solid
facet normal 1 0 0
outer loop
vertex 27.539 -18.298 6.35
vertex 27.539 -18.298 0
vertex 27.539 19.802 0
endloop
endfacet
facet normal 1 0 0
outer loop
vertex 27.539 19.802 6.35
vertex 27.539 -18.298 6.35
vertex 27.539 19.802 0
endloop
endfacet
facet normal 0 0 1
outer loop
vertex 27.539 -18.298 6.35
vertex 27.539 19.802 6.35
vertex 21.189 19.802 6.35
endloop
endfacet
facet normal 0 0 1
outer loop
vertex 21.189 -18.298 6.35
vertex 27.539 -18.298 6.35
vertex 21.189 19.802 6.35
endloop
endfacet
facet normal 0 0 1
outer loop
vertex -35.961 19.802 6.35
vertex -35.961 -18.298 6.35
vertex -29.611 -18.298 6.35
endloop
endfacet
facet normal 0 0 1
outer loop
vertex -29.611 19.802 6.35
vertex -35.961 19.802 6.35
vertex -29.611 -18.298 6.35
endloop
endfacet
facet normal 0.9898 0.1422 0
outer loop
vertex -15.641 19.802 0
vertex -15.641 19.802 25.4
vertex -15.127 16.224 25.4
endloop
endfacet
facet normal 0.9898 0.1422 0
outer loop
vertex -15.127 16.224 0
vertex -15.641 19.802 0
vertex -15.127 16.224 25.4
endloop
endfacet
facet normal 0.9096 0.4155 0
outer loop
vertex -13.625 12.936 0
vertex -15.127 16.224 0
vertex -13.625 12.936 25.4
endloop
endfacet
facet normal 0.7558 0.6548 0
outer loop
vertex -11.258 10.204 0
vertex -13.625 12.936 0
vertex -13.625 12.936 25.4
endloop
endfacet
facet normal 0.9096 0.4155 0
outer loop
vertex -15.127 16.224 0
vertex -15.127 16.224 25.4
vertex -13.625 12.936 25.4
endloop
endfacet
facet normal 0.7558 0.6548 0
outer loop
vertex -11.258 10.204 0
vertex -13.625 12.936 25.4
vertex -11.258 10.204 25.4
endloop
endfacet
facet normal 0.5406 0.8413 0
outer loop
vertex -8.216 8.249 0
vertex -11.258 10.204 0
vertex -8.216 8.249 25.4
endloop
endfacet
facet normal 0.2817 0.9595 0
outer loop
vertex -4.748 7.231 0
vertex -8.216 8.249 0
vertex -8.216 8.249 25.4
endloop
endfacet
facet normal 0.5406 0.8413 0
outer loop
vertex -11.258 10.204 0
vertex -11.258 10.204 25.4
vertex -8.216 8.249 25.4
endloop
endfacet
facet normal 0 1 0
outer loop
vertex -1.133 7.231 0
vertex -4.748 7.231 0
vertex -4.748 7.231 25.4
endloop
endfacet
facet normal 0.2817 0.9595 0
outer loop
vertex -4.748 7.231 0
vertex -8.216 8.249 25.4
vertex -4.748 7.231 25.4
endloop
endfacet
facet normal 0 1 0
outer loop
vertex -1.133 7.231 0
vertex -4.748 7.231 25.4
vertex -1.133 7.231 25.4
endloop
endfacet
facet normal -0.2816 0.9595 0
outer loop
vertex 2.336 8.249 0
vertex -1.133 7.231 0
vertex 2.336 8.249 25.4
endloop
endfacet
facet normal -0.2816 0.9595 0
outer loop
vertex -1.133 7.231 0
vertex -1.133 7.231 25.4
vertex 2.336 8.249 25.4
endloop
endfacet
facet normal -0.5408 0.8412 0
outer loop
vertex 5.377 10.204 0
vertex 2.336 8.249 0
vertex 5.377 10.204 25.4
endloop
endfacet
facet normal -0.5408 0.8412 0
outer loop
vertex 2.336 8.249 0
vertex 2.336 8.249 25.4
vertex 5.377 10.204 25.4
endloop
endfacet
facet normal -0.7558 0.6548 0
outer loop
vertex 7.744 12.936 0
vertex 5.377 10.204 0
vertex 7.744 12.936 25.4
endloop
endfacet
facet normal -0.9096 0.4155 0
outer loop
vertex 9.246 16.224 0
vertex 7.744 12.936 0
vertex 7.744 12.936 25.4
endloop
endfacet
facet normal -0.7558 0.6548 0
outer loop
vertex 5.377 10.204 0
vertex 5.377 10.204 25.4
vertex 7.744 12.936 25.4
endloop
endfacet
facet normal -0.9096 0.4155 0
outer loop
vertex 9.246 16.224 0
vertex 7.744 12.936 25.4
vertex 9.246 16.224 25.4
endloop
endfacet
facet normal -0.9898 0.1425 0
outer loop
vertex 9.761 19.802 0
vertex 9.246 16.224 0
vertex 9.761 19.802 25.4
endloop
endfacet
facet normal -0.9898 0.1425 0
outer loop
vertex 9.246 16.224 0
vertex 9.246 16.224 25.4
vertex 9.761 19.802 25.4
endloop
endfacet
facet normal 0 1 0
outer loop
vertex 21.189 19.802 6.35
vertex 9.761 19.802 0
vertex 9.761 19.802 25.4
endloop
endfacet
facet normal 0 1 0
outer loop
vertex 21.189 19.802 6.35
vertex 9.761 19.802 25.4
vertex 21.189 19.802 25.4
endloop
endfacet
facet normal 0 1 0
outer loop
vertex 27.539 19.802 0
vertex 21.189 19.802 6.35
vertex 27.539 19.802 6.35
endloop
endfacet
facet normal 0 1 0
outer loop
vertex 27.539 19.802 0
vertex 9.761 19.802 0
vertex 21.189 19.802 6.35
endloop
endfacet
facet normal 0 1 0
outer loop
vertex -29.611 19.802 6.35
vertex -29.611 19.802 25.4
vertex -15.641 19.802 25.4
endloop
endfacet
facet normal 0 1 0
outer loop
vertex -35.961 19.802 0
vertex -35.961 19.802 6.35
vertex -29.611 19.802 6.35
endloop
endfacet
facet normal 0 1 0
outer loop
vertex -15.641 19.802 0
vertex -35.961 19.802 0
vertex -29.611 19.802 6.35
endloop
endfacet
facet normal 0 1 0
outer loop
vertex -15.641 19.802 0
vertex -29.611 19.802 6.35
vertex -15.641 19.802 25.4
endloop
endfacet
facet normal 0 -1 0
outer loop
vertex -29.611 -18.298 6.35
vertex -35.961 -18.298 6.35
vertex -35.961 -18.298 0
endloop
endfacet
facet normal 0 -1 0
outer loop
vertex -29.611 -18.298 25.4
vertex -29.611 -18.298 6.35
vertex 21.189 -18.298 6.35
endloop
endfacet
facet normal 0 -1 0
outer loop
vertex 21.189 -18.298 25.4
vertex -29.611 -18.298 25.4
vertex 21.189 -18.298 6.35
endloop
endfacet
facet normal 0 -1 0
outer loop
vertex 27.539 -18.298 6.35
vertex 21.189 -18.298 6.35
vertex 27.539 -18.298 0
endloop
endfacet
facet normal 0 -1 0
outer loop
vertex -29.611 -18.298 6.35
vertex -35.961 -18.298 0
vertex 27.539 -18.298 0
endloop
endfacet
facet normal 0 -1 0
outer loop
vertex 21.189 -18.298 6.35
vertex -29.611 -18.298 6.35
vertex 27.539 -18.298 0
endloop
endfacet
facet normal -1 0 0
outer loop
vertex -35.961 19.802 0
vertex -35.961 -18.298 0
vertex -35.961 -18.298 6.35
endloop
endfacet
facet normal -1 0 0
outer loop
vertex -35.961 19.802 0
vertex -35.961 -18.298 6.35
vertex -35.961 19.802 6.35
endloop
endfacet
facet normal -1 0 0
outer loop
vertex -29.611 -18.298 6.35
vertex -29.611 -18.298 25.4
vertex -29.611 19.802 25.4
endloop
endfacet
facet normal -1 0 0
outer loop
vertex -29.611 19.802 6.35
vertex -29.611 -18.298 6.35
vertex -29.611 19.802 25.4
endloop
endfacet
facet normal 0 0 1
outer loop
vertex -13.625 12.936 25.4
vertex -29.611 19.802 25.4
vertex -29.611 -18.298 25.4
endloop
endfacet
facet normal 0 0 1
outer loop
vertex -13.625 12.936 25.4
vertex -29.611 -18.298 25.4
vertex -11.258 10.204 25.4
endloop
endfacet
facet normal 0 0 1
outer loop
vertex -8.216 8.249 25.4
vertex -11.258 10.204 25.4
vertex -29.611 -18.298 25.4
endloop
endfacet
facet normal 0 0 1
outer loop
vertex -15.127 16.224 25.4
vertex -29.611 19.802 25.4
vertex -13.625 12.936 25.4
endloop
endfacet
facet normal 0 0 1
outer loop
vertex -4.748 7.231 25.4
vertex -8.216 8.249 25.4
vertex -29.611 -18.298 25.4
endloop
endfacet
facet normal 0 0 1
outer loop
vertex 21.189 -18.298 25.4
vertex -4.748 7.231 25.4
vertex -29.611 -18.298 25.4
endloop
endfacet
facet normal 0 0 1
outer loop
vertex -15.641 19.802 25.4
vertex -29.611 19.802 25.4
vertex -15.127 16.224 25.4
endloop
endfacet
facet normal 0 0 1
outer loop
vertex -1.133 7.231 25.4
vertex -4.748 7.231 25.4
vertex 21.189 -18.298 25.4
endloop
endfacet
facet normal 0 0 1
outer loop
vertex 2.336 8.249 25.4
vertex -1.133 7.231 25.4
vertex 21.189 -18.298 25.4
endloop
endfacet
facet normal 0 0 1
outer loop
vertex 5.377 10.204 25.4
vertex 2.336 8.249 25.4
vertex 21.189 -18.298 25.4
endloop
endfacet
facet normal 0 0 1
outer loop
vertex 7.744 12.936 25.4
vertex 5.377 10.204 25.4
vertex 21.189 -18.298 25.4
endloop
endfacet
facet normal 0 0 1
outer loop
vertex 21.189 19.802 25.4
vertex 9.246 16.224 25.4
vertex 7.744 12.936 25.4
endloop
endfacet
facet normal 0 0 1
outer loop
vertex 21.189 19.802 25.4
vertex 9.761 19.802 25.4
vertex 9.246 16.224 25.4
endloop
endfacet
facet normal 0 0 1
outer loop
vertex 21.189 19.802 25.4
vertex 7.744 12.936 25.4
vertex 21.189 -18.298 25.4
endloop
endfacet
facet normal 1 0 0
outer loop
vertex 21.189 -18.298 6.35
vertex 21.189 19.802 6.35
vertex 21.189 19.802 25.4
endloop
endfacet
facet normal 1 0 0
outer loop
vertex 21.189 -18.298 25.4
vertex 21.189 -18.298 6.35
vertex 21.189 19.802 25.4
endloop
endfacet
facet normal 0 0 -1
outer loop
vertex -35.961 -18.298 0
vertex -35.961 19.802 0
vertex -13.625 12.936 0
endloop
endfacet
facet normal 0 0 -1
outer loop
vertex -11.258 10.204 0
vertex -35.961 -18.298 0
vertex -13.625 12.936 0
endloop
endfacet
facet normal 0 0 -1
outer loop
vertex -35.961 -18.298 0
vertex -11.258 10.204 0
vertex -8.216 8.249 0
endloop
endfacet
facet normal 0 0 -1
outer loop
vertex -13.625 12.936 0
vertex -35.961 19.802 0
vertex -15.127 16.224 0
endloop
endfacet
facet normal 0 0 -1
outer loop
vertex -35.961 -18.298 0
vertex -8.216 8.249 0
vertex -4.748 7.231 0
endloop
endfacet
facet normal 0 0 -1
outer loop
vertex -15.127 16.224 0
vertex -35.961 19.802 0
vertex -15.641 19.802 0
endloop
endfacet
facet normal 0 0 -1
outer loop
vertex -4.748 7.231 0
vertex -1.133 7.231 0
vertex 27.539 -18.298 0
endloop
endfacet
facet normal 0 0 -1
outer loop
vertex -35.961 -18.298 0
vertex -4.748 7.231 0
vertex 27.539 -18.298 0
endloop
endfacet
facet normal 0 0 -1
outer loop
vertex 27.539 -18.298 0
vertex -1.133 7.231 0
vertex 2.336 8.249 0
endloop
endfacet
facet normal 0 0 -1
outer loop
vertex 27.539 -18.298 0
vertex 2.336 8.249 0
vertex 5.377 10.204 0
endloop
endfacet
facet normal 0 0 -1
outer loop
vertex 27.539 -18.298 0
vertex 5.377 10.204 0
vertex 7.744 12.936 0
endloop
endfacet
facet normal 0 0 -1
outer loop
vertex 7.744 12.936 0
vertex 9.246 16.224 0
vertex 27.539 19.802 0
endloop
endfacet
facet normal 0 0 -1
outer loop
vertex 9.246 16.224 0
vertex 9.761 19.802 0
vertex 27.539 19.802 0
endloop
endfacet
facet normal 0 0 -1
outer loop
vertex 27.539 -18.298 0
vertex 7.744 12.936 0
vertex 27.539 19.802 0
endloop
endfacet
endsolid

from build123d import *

# Parameters (mm, degrees)
F0_W     = 63.5
F0_H     = 38.1
F1_DEPTH = 25.4
F2_W     = 6.35
F2_H     = 38.1
F3_DEPTH = 19.05
F5_W     = 6.35
F5_H     = 19.05
F6_DEPTH = 38.101
F7_R     = 12.701006
F8_DEPTH = 25.401


with BuildPart() as f1:
    # F0 (on Top) → F1 (new body)
    with BuildSketch(Plane.XY):
        with Locations((-4.211051, 0.752282)):
            Rectangle(F0_W, F0_H)
    extrude(amount=F1_DEPTH)

    # F2 (on face) → F3 (cut)
    with BuildSketch(Plane.XY.offset(25.4)):
        with Locations((-32.786051, 0.752282)):
            Rectangle(F2_W, F2_H)
    extrude(amount=-F3_DEPTH, mode=Mode.SUBTRACT)

    # F5 (on face) → F6 (cut, through all)
    with BuildSketch(Plane(origin=(0, 19.802282, 0), x_dir=(-1, 0, 0), z_dir=(0, 1, 0))):
        with Locations((-24.363949, 15.875)):
            Rectangle(F5_W, F5_H)
    extrude(amount=-F6_DEPTH, mode=Mode.SUBTRACT)

    # F7 (on face) → F8 (cut, through all)
    with BuildSketch(Plane.XY.offset(25.4)):
        with Locations((-2.940286, 19.802282)):
            Circle(F7_R)
    extrude(amount=-F8_DEPTH, mode=Mode.SUBTRACT)


solid = f1.part
